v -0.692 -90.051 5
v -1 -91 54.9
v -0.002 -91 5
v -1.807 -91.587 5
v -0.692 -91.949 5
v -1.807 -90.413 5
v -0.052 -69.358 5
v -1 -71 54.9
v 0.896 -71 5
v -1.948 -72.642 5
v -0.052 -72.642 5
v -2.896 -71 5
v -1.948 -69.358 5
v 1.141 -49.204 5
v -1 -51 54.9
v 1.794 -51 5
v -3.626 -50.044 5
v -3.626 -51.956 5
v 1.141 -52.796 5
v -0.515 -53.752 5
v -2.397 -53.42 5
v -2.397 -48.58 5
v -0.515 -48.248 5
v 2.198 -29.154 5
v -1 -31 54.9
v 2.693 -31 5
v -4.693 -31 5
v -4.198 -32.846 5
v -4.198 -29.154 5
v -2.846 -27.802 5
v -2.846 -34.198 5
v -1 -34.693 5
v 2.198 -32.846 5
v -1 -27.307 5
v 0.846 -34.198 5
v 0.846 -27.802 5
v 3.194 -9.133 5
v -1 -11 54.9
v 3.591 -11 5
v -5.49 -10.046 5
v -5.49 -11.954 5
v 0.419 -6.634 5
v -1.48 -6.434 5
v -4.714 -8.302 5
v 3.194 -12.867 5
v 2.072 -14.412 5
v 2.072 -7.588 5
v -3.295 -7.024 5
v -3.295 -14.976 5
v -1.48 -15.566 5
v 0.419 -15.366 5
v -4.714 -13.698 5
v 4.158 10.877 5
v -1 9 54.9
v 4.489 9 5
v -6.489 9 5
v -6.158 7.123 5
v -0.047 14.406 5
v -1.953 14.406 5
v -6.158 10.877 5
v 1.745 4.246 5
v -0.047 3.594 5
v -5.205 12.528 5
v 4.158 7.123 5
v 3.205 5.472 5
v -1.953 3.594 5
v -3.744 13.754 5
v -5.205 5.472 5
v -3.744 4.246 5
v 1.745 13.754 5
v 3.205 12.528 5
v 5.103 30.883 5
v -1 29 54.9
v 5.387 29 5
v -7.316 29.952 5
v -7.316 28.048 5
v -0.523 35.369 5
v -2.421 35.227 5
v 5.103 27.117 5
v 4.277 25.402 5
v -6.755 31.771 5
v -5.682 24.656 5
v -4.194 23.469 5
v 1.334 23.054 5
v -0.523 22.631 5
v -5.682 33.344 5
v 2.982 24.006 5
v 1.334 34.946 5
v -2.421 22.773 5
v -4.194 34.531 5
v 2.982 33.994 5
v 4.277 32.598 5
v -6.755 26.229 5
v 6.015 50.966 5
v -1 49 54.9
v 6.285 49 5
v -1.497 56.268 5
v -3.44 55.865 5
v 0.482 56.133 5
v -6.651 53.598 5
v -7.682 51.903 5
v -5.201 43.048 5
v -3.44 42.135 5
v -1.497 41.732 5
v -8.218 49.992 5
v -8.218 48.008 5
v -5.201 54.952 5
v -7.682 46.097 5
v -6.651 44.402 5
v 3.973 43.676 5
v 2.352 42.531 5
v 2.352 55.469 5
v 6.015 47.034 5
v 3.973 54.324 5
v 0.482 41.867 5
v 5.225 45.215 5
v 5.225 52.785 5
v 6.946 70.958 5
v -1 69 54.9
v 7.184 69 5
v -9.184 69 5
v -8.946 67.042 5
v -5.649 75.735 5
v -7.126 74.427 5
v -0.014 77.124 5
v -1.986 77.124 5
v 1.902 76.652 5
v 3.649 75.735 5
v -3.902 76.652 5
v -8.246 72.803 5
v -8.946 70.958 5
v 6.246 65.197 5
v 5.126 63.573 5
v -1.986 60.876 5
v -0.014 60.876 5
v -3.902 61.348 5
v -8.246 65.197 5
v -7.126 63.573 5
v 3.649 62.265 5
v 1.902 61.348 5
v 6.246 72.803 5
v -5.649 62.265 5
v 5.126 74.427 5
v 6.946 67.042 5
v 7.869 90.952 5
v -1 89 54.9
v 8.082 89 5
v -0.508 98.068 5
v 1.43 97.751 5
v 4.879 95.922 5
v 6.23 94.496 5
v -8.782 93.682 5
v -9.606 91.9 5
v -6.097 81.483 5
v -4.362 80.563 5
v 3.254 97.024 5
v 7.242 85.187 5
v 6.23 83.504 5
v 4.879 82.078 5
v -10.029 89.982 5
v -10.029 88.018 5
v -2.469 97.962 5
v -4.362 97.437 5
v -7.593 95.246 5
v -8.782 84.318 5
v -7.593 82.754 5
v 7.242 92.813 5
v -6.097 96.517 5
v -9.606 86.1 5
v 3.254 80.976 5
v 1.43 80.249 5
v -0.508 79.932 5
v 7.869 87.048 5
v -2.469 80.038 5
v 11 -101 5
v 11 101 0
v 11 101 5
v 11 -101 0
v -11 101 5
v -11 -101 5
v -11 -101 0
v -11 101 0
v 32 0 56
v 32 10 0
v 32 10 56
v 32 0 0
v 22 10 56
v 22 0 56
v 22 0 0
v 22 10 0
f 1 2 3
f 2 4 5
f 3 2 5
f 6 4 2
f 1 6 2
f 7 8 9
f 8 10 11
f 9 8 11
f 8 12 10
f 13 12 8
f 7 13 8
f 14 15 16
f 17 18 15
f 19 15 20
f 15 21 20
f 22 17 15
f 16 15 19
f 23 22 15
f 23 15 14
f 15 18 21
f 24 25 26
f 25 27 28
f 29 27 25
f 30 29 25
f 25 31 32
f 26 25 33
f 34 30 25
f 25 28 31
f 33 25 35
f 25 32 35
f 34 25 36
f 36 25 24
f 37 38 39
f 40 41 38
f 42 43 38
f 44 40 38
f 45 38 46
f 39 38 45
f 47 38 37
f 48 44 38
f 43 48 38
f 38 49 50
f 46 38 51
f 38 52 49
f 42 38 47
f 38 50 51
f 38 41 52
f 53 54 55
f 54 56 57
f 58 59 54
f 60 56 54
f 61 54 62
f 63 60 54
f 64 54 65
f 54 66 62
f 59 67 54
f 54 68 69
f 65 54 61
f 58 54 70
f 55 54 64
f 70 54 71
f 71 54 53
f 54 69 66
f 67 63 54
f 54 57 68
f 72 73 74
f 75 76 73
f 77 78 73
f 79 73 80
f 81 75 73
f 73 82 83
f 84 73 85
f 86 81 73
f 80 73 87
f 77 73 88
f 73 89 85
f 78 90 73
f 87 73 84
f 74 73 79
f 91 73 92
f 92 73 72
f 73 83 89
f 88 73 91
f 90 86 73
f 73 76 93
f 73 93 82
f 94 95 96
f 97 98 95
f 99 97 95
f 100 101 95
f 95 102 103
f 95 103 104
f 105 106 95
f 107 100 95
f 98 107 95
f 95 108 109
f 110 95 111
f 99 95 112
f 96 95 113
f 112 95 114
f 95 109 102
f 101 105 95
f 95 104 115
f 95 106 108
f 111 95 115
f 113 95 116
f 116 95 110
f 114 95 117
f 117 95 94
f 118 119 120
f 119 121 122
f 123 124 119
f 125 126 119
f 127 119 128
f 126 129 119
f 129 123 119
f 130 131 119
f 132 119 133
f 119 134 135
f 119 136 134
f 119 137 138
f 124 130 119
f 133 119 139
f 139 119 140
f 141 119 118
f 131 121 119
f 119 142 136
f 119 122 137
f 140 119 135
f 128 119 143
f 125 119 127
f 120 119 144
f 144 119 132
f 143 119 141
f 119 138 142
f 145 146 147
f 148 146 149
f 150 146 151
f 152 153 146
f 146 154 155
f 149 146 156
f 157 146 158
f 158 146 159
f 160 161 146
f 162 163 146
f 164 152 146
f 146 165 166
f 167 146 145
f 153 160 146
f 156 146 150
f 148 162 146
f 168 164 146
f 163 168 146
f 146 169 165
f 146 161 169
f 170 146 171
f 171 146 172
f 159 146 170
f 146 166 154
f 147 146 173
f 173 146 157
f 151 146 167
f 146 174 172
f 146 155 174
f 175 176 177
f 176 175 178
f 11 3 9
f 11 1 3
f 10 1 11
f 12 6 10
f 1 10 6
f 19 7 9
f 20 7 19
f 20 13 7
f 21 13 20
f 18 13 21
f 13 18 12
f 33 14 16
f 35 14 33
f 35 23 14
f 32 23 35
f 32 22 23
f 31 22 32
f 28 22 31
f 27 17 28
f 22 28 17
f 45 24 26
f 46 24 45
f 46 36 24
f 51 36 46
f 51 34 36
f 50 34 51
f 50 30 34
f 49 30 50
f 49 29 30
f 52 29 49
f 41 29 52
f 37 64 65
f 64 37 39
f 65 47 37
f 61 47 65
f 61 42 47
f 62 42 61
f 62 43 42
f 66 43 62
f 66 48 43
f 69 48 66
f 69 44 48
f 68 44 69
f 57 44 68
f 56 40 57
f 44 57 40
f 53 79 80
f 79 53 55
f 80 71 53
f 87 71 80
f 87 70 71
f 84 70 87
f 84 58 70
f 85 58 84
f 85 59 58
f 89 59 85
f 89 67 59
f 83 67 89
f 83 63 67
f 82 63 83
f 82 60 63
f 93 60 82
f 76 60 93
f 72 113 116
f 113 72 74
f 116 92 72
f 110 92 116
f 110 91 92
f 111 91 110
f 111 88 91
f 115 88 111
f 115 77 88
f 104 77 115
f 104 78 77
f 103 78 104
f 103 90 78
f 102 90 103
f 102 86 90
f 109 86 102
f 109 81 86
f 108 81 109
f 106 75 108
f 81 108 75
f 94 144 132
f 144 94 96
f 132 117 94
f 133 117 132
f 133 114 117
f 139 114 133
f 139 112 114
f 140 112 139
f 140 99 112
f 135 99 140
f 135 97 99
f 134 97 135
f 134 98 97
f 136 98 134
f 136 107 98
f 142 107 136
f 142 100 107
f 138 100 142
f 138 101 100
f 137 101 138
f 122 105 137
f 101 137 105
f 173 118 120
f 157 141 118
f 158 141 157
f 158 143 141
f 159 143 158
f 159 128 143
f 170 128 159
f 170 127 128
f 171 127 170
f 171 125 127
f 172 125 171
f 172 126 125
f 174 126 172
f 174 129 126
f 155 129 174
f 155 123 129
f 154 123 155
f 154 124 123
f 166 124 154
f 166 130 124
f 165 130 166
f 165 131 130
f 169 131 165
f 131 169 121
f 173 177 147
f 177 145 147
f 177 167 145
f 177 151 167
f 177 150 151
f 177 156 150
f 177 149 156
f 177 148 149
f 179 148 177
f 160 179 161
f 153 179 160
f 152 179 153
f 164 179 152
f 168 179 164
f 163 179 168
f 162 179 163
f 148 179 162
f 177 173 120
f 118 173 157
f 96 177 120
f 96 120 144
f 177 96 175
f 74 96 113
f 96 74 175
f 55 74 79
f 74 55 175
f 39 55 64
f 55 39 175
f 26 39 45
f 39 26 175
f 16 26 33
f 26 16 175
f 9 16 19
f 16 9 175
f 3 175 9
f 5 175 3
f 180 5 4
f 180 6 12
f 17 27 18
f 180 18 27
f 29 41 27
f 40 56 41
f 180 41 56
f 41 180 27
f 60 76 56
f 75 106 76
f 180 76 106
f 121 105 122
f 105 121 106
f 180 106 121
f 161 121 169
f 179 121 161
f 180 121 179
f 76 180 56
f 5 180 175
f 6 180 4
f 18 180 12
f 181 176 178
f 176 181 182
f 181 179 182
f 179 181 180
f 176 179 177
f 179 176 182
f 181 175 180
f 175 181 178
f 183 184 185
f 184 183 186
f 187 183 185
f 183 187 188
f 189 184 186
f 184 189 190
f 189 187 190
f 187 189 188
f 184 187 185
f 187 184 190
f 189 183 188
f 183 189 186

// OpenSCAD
height = 50;
radius_min = 1;
radius_max = 10;
count = 10;

radius_step = (radius_max - radius_min) / count;

base_height = 5;
base_width = 2*radius_max + 2;
base_thickness = 2*radius_max * count + 2;

translate([-base_width/2, -base_thickness/2, 0])
union() {
cube([base_width, base_thickness, base_height]);

translate([radius_max, radius_max, base_height-0.1])
for(i = [0:count-1]) {
  radius = radius_min + radius_step * i;
  translate([0, i*2*radius_max, 0])
  cylinder(h=height, r1=radius, r2=0);
}
}

translate([base_width, 0, 0])
cube([10, 10, height+base_height+1]);
